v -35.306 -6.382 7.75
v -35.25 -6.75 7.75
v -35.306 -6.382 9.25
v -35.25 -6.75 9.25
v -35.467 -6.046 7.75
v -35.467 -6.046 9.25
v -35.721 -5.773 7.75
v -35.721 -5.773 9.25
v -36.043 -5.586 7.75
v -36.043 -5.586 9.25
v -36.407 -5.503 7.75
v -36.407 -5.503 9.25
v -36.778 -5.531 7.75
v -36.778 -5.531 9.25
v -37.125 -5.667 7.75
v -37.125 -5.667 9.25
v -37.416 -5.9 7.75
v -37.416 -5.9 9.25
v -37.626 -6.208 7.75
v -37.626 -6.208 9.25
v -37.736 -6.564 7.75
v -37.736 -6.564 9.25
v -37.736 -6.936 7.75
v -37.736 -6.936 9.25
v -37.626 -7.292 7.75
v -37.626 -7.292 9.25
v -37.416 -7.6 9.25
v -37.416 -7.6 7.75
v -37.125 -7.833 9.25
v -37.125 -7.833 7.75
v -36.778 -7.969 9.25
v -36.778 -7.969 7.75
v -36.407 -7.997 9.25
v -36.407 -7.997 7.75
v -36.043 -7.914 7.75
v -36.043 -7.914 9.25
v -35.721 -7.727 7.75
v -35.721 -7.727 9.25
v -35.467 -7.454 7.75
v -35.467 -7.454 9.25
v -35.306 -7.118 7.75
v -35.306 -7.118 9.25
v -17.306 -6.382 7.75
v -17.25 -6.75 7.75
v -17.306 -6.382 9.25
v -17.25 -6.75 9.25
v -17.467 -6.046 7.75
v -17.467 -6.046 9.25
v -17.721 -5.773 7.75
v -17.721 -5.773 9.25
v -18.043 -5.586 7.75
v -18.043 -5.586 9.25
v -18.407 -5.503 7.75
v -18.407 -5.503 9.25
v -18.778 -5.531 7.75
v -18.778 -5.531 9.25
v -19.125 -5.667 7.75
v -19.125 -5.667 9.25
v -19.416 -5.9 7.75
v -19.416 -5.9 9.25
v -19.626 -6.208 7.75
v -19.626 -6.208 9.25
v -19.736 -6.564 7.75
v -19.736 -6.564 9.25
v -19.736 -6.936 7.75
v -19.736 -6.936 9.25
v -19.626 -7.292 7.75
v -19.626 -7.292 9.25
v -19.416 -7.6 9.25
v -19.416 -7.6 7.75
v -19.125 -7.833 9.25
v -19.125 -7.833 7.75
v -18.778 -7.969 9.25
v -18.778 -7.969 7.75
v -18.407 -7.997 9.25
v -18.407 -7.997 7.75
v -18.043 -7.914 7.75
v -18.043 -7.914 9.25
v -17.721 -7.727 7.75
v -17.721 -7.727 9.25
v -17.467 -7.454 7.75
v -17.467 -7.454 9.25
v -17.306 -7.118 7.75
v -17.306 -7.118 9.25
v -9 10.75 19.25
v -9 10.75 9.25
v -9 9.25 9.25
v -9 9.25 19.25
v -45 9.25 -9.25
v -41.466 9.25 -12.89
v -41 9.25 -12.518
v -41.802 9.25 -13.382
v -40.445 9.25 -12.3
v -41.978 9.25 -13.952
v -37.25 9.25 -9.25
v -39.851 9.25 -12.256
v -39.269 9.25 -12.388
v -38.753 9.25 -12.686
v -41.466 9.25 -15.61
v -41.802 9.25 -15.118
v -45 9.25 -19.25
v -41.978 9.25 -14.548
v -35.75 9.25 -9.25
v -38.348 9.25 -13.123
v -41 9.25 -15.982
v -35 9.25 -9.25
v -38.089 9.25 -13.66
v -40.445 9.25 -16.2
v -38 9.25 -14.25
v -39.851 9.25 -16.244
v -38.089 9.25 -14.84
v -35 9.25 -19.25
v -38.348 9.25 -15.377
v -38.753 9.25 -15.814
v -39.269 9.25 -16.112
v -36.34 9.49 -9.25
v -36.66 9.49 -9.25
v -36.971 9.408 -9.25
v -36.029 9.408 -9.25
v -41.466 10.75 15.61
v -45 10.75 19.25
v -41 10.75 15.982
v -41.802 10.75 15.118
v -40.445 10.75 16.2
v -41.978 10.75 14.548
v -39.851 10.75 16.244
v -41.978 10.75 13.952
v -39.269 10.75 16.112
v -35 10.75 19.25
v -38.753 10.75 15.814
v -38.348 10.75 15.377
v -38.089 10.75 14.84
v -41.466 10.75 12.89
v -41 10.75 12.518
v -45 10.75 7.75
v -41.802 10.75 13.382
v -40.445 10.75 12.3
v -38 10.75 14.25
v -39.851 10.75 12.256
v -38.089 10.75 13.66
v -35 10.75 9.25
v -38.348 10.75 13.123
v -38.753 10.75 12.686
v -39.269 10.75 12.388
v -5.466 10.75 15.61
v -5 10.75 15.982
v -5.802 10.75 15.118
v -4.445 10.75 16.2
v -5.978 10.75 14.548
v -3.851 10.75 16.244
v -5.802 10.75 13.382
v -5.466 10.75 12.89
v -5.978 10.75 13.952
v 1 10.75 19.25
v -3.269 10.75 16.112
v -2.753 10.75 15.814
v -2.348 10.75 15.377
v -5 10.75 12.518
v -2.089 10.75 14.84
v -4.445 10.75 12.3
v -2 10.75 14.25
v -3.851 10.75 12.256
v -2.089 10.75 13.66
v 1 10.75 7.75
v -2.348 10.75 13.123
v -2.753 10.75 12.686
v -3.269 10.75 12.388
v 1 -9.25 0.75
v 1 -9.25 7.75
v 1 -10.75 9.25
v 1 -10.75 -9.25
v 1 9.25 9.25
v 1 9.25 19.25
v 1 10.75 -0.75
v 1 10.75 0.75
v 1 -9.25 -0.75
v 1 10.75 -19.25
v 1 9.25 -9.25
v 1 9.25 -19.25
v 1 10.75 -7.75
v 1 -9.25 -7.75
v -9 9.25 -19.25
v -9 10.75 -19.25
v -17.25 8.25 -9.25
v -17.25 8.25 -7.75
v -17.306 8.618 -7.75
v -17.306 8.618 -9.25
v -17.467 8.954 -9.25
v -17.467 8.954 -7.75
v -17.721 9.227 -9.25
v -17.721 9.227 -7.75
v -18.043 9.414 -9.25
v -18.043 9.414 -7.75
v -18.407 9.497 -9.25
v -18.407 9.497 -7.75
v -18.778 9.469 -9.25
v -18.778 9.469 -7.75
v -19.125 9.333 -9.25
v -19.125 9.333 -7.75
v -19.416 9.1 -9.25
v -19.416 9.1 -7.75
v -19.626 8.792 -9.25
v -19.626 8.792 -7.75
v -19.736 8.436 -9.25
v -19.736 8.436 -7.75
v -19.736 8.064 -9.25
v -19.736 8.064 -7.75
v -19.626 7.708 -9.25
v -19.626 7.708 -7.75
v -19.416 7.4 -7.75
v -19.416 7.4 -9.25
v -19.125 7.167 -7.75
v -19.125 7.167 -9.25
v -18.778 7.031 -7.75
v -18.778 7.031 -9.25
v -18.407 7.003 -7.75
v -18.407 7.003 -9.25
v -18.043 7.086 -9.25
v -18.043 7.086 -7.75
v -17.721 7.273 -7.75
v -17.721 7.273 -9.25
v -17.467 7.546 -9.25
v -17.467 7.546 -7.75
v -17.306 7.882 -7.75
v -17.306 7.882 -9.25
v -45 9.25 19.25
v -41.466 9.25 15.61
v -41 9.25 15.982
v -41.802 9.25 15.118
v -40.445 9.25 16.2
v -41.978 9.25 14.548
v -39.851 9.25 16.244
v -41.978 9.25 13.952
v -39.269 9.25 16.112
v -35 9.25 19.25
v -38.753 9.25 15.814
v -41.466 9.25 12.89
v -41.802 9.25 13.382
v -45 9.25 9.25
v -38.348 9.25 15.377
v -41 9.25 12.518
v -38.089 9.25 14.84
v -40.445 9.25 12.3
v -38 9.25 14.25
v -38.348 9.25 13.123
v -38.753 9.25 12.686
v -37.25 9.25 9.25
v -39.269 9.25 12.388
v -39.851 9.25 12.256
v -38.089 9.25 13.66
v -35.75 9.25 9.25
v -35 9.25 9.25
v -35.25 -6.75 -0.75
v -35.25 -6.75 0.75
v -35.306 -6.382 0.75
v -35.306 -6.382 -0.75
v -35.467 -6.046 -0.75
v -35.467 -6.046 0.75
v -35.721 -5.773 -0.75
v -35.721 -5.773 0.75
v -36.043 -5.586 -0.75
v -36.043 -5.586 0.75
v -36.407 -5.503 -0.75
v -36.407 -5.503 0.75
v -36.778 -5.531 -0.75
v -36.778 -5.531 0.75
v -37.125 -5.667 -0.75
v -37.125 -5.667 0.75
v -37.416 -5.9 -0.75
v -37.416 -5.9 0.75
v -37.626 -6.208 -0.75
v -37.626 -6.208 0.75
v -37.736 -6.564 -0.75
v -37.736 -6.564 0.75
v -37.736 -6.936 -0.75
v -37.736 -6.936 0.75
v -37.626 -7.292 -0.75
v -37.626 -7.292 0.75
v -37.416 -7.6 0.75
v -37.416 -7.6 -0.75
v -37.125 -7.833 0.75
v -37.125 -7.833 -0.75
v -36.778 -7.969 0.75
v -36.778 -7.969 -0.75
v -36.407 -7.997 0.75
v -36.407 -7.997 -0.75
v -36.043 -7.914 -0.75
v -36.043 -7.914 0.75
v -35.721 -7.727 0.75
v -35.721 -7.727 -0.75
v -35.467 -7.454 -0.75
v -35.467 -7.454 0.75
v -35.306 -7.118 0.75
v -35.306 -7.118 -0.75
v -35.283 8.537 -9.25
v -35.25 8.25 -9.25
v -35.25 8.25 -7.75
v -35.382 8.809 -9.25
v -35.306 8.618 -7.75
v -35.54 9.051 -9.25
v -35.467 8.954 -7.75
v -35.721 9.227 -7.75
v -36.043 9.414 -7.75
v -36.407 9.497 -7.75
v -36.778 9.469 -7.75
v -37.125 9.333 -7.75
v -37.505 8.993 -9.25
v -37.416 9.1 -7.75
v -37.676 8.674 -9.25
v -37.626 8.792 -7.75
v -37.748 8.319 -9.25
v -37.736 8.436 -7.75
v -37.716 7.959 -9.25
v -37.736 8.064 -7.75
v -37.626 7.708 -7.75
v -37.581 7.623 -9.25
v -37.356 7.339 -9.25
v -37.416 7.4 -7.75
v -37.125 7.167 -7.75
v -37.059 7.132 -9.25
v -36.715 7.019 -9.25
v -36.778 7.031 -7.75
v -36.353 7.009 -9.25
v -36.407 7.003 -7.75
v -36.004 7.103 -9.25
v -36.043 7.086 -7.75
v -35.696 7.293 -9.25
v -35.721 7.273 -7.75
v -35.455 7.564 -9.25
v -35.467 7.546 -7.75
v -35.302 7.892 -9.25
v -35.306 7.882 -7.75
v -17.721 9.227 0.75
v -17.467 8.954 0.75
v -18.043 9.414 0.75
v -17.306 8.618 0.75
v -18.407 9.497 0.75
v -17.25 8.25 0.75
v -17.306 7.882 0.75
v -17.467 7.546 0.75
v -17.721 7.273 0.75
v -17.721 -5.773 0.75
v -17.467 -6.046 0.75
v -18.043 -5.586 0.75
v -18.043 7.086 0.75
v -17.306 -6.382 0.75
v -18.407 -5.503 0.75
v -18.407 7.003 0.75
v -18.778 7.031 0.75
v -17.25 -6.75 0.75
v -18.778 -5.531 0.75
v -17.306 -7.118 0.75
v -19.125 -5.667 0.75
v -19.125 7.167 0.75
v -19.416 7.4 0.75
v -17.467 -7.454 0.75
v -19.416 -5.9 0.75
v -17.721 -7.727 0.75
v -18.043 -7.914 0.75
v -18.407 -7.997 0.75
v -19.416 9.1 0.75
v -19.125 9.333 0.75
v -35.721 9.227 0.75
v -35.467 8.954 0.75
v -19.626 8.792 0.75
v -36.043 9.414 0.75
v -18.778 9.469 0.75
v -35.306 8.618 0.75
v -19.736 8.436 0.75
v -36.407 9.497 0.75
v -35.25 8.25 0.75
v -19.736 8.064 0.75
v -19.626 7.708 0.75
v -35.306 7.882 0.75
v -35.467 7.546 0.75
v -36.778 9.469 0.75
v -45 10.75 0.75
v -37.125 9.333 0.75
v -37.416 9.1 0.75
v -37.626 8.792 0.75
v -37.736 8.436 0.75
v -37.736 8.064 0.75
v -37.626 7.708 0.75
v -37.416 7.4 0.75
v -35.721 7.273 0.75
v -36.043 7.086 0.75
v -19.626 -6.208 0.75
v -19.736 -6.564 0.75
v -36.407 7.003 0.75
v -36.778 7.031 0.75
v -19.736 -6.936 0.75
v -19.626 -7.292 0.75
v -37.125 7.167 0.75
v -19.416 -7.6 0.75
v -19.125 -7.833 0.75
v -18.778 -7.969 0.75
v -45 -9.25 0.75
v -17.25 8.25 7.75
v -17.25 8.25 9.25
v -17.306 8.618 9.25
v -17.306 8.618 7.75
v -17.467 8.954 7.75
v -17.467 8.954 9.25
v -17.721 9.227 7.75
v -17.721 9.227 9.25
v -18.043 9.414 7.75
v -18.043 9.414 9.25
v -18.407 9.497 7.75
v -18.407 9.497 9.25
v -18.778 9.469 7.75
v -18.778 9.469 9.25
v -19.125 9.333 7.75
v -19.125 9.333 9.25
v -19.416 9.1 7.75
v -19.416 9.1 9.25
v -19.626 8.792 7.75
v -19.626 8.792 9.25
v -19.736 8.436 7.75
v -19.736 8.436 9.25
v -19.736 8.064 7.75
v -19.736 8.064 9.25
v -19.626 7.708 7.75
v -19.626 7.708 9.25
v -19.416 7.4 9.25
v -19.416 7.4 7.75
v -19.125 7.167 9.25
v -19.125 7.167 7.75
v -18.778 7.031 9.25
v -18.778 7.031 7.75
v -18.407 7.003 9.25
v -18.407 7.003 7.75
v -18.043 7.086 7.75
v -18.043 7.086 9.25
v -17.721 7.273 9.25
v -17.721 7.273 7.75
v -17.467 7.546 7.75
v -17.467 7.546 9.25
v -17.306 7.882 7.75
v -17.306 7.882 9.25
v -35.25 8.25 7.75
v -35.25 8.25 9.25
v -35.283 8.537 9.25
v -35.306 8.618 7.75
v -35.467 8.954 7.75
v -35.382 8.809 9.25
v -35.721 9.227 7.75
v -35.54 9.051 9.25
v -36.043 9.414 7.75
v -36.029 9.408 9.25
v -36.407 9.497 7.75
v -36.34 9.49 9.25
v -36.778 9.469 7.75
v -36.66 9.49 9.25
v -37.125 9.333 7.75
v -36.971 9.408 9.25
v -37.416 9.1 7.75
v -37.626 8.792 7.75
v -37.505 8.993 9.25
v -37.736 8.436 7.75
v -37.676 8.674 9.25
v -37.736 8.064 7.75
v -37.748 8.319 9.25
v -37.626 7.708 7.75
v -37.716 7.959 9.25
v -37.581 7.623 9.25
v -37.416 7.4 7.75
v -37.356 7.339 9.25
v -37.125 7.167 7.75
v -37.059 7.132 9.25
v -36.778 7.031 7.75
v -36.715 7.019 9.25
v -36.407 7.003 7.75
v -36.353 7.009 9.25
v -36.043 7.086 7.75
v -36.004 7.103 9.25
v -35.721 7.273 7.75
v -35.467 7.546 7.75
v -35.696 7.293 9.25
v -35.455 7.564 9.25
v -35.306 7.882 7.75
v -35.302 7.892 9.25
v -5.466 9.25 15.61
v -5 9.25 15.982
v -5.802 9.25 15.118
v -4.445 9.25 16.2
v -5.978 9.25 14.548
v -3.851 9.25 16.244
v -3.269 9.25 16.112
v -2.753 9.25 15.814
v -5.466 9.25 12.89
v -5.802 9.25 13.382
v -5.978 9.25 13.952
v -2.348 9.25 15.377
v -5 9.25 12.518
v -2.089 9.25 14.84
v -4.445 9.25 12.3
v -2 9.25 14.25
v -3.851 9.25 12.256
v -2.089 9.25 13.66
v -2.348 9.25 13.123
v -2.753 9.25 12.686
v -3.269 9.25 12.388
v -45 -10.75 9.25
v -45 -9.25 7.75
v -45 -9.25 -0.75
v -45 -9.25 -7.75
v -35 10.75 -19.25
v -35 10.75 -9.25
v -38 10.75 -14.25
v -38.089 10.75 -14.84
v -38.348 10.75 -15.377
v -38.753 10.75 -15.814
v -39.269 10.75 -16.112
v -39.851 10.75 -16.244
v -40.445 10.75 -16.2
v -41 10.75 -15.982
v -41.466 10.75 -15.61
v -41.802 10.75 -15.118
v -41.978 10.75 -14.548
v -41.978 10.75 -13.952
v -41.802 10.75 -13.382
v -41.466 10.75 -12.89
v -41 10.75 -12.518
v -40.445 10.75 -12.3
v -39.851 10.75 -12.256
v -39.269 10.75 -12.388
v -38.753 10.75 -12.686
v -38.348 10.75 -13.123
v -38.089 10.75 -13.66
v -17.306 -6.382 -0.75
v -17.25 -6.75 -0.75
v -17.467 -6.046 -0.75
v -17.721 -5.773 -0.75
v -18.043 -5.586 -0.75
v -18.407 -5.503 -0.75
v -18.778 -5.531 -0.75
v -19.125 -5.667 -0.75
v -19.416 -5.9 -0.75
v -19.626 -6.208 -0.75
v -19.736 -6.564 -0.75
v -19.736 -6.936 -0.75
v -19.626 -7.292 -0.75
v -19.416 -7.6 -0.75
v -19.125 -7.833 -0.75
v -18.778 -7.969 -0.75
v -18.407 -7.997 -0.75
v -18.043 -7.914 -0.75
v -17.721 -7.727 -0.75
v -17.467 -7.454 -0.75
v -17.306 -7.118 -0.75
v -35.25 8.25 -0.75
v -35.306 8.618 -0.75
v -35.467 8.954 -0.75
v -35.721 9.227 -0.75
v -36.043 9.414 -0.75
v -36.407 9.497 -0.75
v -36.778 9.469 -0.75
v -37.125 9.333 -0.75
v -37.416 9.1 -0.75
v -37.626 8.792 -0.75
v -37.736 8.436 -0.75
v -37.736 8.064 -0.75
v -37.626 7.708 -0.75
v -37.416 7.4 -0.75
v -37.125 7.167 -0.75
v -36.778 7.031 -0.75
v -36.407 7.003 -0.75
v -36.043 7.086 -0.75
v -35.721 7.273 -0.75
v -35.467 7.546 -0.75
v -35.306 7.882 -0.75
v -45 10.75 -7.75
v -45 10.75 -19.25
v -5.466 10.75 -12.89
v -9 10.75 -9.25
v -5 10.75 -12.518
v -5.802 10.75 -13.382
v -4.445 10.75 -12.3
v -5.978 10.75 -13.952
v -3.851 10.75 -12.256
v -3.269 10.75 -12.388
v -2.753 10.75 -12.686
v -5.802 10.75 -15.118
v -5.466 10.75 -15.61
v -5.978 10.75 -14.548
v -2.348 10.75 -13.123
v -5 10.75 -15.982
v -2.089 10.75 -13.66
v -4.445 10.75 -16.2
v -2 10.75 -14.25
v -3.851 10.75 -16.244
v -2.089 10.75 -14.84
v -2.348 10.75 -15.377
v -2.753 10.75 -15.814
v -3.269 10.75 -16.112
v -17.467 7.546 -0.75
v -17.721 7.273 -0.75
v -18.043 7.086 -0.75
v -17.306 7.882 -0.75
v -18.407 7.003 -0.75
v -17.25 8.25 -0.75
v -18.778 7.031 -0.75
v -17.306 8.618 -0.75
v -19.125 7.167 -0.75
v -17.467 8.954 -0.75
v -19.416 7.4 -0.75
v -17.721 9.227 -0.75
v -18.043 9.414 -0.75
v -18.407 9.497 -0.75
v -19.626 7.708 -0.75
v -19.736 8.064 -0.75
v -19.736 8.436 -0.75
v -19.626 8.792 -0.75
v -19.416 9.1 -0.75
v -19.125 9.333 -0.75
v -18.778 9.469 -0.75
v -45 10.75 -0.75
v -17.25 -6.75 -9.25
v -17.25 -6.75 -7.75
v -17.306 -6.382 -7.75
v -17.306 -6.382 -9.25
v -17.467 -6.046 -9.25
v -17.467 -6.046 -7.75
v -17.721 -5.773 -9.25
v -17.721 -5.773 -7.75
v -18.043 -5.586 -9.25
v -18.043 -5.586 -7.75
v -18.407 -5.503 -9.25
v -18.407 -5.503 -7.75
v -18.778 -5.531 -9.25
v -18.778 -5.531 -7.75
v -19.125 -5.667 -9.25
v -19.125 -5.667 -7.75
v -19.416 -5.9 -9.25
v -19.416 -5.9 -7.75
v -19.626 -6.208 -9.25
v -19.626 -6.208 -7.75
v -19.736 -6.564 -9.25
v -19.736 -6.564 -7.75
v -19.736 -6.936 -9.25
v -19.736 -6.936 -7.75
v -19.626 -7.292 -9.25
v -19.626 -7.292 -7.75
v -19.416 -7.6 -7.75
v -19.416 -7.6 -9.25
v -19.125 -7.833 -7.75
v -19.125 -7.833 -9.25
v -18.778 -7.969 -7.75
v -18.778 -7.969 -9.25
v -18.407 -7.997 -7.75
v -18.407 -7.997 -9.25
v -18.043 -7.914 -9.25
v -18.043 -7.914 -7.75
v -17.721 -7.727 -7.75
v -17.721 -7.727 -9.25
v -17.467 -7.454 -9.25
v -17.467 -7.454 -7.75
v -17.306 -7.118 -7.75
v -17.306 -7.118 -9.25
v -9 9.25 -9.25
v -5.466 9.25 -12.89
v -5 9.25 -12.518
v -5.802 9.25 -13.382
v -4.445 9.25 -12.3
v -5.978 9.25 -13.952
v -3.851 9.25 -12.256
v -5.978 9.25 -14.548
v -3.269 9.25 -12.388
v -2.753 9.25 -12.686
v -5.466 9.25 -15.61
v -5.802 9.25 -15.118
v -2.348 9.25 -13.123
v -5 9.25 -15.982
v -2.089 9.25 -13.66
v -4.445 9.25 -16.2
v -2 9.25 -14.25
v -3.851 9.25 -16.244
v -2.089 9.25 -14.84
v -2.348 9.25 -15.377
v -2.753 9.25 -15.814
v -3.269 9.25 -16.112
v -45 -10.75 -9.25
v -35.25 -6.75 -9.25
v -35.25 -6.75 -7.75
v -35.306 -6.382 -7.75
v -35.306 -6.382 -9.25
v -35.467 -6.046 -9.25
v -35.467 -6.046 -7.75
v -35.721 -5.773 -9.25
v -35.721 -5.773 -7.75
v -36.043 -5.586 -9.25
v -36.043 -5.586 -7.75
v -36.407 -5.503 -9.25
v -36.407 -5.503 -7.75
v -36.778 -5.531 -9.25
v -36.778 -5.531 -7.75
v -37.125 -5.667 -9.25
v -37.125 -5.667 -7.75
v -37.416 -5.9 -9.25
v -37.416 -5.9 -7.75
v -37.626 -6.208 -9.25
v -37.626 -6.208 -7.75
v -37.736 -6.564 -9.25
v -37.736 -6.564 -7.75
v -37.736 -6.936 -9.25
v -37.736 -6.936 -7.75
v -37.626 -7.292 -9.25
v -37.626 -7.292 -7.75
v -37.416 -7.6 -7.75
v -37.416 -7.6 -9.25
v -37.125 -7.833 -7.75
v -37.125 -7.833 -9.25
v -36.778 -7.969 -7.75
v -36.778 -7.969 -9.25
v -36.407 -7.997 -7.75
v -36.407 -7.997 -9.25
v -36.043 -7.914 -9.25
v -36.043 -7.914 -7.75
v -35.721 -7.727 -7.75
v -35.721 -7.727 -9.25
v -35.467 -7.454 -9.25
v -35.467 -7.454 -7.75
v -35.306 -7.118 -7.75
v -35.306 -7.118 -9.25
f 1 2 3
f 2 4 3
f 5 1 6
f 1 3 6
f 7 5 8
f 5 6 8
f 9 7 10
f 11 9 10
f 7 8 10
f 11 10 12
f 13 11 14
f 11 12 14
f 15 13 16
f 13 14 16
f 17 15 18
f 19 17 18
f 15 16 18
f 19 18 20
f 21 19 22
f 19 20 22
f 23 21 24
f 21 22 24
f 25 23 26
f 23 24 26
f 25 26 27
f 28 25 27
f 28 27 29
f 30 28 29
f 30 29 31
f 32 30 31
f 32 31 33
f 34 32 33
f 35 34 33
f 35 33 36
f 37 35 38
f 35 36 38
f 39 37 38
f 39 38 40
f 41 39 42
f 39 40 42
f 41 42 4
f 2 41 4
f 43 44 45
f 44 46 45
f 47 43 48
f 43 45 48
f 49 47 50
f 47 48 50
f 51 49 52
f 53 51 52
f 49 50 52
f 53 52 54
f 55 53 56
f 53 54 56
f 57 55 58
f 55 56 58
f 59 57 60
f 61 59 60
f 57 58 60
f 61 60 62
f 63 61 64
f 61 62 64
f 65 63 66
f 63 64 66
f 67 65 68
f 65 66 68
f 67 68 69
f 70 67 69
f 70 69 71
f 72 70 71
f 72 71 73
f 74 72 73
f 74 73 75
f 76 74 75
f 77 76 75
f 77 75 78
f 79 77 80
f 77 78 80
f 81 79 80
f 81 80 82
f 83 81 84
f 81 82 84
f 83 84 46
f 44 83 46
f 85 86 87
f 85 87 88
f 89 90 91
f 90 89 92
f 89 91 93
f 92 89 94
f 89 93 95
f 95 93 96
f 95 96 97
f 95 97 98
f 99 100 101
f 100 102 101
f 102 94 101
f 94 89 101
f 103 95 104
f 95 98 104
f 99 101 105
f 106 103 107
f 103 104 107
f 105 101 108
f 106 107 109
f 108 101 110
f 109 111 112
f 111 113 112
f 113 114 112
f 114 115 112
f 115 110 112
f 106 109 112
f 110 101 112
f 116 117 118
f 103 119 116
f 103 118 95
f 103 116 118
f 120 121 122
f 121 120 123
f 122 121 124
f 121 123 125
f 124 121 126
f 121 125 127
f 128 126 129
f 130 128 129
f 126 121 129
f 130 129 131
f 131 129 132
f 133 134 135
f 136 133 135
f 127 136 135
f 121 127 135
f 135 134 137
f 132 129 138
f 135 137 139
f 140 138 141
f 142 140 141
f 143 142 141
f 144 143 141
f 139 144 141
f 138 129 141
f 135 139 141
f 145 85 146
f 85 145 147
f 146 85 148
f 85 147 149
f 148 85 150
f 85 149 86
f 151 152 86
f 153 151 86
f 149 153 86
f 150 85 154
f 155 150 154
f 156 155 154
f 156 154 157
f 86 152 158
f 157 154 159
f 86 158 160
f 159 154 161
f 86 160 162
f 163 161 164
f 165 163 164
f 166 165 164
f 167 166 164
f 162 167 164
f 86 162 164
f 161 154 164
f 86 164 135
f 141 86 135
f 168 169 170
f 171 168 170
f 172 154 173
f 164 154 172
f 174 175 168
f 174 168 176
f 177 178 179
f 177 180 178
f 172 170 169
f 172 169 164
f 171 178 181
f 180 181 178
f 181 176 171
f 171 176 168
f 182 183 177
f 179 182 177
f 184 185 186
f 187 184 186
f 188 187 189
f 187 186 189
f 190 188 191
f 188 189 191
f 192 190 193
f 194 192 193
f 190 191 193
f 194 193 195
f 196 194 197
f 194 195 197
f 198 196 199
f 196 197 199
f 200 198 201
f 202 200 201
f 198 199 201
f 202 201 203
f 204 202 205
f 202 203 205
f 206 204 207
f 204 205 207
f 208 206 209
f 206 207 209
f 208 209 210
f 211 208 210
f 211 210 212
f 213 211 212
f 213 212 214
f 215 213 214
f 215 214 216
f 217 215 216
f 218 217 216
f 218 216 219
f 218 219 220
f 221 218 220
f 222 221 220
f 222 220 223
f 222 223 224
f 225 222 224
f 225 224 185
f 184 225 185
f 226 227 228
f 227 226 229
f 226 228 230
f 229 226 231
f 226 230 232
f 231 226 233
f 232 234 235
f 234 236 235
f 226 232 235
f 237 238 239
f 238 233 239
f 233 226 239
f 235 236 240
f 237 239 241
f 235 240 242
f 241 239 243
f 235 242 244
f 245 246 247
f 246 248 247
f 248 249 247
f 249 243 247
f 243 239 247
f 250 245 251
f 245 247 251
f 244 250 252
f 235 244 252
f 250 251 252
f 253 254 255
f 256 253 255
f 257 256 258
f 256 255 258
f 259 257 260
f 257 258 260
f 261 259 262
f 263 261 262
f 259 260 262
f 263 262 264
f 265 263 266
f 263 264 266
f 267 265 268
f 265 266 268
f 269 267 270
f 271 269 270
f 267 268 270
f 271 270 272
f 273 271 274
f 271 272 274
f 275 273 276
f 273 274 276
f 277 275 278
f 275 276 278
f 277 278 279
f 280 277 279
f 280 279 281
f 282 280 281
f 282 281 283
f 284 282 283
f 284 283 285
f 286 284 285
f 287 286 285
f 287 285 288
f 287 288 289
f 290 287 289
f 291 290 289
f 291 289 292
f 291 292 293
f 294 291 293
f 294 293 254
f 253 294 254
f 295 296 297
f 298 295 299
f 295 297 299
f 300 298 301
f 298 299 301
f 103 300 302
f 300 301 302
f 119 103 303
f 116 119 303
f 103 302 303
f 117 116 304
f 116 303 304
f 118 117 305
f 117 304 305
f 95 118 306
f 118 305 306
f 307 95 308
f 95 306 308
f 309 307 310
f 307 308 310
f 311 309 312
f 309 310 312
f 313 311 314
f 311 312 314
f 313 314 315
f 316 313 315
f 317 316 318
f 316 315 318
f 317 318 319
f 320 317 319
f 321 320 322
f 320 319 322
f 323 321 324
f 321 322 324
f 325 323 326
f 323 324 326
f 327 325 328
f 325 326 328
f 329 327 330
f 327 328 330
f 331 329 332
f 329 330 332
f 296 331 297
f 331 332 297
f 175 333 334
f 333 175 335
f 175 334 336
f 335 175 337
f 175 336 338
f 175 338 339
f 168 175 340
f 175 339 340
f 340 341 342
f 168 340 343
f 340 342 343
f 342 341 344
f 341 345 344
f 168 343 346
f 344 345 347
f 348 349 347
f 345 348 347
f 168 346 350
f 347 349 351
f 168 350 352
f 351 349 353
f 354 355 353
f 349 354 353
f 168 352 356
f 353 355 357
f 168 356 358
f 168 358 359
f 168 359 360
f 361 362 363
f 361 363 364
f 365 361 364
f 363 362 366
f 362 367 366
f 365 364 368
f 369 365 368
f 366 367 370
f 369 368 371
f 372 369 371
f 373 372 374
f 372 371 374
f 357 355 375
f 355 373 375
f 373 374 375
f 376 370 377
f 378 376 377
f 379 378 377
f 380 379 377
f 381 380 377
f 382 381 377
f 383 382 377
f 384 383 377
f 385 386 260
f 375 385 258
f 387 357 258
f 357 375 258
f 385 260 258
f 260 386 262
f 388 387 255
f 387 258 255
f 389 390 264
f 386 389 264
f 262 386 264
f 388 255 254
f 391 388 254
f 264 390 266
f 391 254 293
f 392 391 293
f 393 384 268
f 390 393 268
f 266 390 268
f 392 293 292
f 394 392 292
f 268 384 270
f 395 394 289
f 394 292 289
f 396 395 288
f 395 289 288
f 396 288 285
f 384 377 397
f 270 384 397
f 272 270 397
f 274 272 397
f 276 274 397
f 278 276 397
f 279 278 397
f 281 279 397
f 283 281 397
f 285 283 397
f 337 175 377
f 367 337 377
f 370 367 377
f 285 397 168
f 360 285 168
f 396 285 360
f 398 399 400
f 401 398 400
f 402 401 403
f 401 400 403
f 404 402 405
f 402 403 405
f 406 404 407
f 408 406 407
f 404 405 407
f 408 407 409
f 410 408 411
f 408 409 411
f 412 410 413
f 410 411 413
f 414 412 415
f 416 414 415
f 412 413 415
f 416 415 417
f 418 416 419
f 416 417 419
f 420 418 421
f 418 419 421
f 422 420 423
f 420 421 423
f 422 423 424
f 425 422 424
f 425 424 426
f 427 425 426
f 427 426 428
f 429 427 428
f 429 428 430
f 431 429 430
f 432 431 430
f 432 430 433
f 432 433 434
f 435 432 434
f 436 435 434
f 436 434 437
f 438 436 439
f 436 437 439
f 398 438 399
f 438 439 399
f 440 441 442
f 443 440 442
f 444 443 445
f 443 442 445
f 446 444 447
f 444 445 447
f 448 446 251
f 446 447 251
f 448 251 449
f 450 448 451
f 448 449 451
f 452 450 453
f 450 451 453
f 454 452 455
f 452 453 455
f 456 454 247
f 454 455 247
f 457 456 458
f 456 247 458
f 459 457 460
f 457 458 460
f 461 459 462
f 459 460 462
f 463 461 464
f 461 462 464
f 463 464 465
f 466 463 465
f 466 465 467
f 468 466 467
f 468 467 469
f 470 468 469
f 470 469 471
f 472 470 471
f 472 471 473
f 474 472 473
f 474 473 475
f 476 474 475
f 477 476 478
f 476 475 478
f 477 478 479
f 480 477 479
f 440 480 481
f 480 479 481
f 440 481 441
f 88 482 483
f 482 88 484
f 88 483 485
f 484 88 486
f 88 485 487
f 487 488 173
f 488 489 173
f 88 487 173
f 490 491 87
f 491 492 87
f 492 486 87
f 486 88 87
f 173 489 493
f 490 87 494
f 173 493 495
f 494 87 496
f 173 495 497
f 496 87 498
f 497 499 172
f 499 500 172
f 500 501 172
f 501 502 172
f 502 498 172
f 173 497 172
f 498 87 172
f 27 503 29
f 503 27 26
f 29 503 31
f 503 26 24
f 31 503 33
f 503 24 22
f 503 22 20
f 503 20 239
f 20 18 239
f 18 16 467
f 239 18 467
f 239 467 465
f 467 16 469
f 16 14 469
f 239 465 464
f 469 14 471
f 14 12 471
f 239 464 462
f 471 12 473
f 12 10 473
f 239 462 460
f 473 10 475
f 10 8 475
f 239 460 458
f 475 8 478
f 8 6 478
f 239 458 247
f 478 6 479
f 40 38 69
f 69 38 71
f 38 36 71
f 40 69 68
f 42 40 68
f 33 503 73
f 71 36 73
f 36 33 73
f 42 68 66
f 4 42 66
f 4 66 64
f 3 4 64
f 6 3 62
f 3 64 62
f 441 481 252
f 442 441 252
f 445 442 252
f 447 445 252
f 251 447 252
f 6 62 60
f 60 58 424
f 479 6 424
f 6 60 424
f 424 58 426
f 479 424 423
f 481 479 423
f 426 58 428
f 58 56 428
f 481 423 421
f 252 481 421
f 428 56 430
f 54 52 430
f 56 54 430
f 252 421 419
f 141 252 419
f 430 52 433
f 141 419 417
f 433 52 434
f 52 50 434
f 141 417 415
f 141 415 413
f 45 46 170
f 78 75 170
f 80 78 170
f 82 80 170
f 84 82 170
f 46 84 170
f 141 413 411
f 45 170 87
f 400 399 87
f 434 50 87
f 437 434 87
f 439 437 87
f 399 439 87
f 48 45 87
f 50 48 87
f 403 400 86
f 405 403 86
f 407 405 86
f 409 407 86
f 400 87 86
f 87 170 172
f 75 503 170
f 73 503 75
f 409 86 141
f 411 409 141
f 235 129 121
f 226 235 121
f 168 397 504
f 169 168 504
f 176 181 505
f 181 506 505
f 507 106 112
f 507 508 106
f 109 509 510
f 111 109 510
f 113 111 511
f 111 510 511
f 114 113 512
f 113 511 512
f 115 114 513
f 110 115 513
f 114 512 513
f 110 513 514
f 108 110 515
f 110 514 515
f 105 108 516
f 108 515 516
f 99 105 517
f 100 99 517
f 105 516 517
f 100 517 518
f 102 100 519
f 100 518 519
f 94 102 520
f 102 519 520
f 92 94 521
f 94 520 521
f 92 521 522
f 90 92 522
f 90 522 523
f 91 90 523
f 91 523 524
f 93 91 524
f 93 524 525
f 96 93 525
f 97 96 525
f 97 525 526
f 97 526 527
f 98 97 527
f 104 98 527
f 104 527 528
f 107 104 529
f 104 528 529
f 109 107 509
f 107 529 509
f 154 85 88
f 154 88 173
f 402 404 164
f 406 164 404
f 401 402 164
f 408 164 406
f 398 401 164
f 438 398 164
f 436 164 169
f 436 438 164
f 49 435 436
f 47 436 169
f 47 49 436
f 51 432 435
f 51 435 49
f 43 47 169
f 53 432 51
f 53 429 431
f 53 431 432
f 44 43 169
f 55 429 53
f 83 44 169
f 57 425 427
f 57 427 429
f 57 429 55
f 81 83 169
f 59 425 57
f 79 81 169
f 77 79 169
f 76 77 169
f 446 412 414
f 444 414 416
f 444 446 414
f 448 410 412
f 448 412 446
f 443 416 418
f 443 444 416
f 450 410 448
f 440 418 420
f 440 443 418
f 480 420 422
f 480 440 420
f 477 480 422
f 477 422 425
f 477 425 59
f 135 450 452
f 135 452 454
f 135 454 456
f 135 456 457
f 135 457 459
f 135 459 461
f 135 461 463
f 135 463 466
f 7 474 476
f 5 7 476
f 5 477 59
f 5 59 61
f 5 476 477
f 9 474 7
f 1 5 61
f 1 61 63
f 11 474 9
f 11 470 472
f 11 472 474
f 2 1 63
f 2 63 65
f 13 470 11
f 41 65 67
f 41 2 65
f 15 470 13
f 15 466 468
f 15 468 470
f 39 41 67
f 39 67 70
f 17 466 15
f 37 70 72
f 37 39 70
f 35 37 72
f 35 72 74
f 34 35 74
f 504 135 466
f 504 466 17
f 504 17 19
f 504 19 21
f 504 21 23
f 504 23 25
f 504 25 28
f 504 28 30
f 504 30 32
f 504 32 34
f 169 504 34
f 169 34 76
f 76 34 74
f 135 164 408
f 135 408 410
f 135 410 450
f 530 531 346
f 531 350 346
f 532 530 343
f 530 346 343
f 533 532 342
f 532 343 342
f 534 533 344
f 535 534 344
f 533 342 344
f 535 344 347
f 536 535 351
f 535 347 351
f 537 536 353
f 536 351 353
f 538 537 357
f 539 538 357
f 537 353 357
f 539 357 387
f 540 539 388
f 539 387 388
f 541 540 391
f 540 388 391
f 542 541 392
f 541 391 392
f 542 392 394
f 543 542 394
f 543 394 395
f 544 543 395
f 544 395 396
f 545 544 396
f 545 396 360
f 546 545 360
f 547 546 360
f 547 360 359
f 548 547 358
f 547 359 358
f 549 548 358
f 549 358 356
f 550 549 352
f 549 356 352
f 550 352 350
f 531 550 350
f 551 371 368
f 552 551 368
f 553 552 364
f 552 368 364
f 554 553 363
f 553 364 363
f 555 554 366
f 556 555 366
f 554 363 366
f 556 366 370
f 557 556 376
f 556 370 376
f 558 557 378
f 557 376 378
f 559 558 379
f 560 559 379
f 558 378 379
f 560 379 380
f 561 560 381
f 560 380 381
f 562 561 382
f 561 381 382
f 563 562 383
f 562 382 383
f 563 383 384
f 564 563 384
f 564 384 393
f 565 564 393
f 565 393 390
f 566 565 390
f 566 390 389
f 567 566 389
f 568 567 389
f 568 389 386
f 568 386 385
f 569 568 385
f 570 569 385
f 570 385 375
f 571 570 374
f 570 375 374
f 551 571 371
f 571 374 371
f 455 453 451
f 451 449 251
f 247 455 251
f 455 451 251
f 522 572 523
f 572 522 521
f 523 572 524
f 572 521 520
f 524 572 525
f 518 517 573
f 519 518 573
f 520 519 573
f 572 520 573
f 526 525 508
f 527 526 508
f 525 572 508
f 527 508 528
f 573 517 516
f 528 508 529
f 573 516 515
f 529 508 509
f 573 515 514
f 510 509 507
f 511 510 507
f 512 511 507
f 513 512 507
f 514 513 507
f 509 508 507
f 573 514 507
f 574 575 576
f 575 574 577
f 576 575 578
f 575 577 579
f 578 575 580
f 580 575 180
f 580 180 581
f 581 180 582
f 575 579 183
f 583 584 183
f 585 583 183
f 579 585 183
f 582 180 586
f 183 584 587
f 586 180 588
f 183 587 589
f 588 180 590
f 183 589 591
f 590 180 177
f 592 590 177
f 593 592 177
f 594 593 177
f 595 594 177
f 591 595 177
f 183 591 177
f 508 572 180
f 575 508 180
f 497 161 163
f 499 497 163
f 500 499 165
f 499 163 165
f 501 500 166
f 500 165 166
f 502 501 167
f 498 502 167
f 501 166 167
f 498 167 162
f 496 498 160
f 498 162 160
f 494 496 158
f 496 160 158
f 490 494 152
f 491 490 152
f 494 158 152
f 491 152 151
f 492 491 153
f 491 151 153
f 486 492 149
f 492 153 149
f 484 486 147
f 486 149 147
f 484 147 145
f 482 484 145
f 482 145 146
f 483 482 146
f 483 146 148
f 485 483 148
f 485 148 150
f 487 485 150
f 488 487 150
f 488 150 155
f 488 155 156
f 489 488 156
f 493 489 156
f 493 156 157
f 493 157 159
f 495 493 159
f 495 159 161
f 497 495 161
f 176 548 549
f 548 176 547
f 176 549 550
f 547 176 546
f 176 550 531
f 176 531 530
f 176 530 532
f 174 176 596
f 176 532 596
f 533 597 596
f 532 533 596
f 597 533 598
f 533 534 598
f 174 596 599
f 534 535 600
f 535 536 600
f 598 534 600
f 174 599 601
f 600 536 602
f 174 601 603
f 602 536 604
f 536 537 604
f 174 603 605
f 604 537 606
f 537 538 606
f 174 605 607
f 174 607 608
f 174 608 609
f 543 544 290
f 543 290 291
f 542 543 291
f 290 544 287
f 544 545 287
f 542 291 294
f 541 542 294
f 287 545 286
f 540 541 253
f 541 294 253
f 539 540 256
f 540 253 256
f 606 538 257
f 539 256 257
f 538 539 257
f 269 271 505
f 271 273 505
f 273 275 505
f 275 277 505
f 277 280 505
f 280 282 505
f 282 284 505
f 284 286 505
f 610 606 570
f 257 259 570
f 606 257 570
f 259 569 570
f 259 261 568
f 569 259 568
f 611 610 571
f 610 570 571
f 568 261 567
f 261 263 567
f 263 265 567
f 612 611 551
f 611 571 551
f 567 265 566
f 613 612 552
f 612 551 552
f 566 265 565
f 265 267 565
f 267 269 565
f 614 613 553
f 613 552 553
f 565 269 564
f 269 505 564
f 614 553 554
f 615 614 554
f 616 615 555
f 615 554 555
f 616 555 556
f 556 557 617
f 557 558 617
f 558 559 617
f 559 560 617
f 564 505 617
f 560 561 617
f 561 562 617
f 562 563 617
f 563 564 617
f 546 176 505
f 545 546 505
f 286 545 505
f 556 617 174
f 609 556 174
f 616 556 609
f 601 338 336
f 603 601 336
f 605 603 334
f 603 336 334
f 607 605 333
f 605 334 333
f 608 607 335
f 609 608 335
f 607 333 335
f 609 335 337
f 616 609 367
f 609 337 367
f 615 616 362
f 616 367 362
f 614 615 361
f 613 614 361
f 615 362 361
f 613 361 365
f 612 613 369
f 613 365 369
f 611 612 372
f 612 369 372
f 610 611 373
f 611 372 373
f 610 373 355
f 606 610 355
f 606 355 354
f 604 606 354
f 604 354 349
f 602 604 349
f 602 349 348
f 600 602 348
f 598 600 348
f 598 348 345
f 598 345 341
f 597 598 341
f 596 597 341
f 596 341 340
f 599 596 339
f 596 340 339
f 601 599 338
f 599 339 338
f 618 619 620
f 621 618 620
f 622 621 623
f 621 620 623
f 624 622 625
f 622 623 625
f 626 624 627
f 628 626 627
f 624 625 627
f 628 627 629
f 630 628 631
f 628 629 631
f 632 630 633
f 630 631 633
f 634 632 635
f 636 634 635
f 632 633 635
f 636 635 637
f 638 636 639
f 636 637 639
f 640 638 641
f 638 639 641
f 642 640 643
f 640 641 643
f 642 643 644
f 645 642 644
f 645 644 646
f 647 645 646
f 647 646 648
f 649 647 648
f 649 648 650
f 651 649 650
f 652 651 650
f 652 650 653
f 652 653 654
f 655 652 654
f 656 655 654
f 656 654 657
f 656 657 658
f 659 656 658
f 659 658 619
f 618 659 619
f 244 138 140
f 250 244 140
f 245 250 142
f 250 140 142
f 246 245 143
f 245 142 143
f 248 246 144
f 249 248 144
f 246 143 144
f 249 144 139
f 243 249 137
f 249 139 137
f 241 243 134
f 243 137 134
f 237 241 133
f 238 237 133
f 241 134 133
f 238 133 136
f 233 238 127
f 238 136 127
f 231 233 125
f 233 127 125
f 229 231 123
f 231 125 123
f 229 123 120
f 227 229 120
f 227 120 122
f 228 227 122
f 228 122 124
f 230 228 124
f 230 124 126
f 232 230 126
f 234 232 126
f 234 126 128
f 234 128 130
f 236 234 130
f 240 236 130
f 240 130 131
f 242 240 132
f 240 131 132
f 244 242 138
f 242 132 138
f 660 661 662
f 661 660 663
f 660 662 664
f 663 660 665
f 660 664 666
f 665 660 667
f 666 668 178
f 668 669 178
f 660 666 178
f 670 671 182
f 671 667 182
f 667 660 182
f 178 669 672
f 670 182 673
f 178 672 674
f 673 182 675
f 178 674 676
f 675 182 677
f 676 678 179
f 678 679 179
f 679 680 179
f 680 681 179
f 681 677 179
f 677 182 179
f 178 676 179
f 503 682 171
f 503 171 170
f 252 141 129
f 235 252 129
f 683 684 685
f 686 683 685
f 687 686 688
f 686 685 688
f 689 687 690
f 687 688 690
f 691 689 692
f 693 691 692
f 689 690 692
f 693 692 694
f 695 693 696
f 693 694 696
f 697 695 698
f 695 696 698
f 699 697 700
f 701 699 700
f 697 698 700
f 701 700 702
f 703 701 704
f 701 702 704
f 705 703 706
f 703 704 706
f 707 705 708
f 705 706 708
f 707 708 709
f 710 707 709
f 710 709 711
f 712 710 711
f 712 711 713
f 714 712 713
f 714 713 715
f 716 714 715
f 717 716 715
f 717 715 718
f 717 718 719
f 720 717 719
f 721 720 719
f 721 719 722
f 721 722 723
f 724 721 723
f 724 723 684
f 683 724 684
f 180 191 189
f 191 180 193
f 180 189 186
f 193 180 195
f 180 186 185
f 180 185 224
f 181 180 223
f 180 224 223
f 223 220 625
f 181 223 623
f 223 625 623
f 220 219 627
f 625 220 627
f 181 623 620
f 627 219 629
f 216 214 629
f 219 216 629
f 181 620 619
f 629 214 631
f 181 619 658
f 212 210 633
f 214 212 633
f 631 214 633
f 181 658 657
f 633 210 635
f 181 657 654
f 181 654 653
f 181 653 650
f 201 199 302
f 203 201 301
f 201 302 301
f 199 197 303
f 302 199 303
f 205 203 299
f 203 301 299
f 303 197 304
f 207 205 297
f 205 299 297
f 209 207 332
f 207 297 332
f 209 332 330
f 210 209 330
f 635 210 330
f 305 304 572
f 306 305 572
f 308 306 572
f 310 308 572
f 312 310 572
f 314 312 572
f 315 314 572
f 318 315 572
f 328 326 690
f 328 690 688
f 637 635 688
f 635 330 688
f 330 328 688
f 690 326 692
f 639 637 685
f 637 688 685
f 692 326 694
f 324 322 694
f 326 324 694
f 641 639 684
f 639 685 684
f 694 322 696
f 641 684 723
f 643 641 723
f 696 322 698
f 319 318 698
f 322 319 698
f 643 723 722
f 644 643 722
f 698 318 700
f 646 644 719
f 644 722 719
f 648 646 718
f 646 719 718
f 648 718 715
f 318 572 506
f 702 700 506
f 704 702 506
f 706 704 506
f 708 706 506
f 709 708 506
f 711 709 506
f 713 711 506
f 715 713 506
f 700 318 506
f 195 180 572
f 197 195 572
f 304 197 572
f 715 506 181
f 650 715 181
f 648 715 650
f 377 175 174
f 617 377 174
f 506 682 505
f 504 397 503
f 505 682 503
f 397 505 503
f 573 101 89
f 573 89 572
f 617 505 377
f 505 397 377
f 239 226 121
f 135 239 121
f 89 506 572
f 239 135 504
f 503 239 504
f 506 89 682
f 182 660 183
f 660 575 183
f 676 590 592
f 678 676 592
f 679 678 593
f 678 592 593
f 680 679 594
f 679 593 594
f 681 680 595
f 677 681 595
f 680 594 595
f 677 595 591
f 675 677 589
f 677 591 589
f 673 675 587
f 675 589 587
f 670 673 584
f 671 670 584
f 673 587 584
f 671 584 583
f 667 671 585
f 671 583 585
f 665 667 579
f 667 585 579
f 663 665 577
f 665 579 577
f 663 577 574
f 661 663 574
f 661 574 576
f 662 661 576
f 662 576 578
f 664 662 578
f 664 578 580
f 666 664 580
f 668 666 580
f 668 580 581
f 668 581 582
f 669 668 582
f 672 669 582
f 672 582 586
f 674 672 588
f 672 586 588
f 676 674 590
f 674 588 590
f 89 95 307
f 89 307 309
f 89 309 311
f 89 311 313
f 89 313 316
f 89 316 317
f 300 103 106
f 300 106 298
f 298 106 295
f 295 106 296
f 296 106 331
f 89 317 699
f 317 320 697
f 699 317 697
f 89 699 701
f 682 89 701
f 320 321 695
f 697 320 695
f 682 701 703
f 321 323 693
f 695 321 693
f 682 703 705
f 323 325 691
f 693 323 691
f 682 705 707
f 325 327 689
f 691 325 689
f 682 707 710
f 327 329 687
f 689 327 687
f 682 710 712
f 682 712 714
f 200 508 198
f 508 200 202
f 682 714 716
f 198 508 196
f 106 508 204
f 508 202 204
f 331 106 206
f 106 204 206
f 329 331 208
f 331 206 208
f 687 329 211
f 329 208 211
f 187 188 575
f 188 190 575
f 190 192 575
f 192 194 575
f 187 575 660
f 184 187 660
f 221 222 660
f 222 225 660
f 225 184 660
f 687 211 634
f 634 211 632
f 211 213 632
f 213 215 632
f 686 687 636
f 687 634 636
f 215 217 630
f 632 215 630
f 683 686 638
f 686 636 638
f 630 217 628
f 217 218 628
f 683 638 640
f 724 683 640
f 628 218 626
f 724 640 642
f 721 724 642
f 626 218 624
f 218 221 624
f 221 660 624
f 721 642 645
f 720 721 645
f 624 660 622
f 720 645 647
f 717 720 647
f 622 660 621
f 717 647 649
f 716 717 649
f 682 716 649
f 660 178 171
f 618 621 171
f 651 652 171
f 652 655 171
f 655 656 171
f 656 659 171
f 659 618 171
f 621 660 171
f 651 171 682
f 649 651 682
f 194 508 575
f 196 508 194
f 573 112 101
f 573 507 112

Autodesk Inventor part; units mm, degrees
ref_plane "YZ Plane" through (0, 0, 0) normal (1, 0, 0) x (0, 1, 0)
ref_plane "XZ Plane" through (0, 0, 0) normal (0, 1, 0) x (-1, 0, 0)
ref_plane "XY Plane" through (0, 0, 0) normal (0, 0, 1) x (1, 0, 0)
sketch "스케치1" plane through (0, 0, 0) normal (1, 0, 0) x (0, 1, 0)
  line L0 (10.75, -9.25) -> (-10.75, -9.25)
  line L1 (-10.75, -9.25) -> (-10.75, 9.25)
  line L2 (-10.75, 9.25) -> (10.75, 9.25)
  line L3 (10.75, 9.25) -> (10.75, -9.25)
  line L4 (10.75, -9.25) -> (-10.75, 9.25) construction
  line L5 (-10.75, -9.25) -> (10.75, 9.25) construction
  line L6 (10.75, 7.75) -> (-9.25, 7.75)
  line L7 (-9.25, 7.75) -> (-9.25, 0.75)
  line L8 (-9.25, 0.75) -> (10.75, 0.75)
  line L9 (10.75, 0.75) -> (10.75, 7.75)
  line L10 (-9.25, -7.75) -> (10.75, -7.75)
  line L11 (-9.25, -0.75) -> (-9.25, -7.75)
  line L12 (10.75, -0.75) -> (-9.25, -0.75)
  line L13 (10.75, 9.25) -> (12.25, 9.25)
  line L14 (12.25, 9.25) -> (12.25, -9.25)
  line L15 (12.25, -9.25) -> (10.75, -9.25)
  line L16 (10.75, -9.25) -> (10.75, 9.25)
  point P0 (0, 0)
  point P1 (10.75, -7.75)
  point P2 (10.75, -0.75)
  point P3 (-10, 7.75)
  point P4 (-10, -7.75)
  point P5 (-10, 0.75)
  point P6 (-10, -0.75)
  point P7 (-10, -0.75)
  point P8 (-10, -7.75)
  dimension "d0" = 21.5
  dimension "d1" = 18.5
  dimension "d2" = 20
  dimension "d3" = 7
  dimension "d4" = 1.5
  dimension "d7" = 8.5
  dimension "d18" = 1.5
extrude "돌출1" add sketch "스케치1" against normal blind 45 contours L0 L1 L2 L3 L6 L7 L8 L12 L11 L10
sketch "스케치2" plane through (0, 0, 0) normal (1, 0, 0) x (0, 0, -1)
  line L0 (-9.25, -10.75) -> (9.25, -10.75) projected
  line L1 (-9.25, 10.75) -> (-9.25, -10.75) projected
  line L2 (-9.25, 10.75) -> (9.25, 10.75)
  line L3 (9.25, 10.75) -> (9.25, -10.75)
  line L4 (9.25, -10.75) -> (-9.25, -10.75)
  line L5 (-9.25, -10.75) -> (-9.25, 10.75)
  line L6 (9.25, 10.75) -> (-9.25, 10.75)
  line L7 (-9.25, 10.75) -> (-7.75, 10.75) projected
  point P0 (0, 0)
extrude "돌출2" add sketch "스케치2" along normal blind 1
sketch "스케치4" plane through (-45, -10.75, 9.25) normal (0, 0, 1) x (1, 0, 0)
  circle A0 centre (8.5, 19) radius 1.25 projected
  circle A1 centre (26.5, 19) radius 1.25 projected
  circle A2 centre (26.5, 4) radius 1.25 projected
  circle A3 centre (8.5, 4) radius 1.25 projected
  point P0 (45, 10.75)
extrude "돌출3" cut sketch "스케치4" against normal blind 45
sketch "스케치9" plane through (0, 10.75, 7.75) normal (0, 1, 0) x (1, 0, 0)
  line L0 (-45, 7) -> (-45, 8.5) projected
  line L1 (0, 7) -> (-45, 7) projected
  line L2 (-45, -1.5) -> (1, -1.5) projected
  line L3 (-45, 17) -> (1, 17) projected
  line L4 (-45, 17) -> (-35, 17)
  line L5 (-45, -1.5) -> (-35, -1.5)
  line L6 (-35, -1.5) -> (-35, -11.5)
  line L7 (-35, -11.5) -> (-45, -11.5)
  line L8 (-45, -11.5) -> (-45, -1.5)
  circle A0 centre (-40, -6.5) radius 2
  line L9 (-45, 7.75) -> (0, 7.75) construction
  line L10 (-22, -1.5) -> (-22, 17) construction
  line L11 (-35, 17) -> (-35, 27)
  line L12 (-35, 27) -> (-45, 27)
  line L13 (-45, 27) -> (-45, 17)
  circle A1 centre (-40, 22) radius 2
  line L14 (-45, 17) -> (-35, 17)
  line L15 (1, 17) -> (-9, 17)
  line L16 (1, -1.5) -> (-9, -1.5)
  line L17 (-9, -1.5) -> (-9, -11.5)
  line L18 (-9, -11.5) -> (1, -11.5)
  line L19 (1, -11.5) -> (1, -1.5)
  circle A2 centre (-4, -6.5) radius 2
  circle A3 centre (-4, 22) radius 2
  line L20 (-9, 17) -> (-9, 27)
  line L21 (-9, 27) -> (1, 27)
  line L22 (1, 27) -> (1, 17)
  line L23 (1, 17) -> (-9, 17)
  point P0 (-9, 17)
  dimension "d31" = 10
  dimension "d32" = 10
  dimension "d33" = 4
  dimension "d34" = 5
  dimension "d35" = 5
extrude "돌출6" add sketch "스케치9" against normal blind 1.5
sketch "스케치10" plane through (0, 0, 0) normal (-1, 0, 0) x (0, 0, 1)
  line L0 (-0.75, -9.25) -> (-0.75, 10.75) projected
  line L1 (-7.75, 10.75) -> (-0.75, 10.75) projected
  line L2 (-7.75, 10.75) -> (-7.75, -9.25) projected
  line L3 (-7.75, -9.25) -> (-0.75, -9.25) projected
  line L4 (1.75, 10.75) -> (1.75, -9.25) projected
  line L5 (1.75, -9.25) -> (7.75, -9.25) projected
  line L6 (7.75, 10.75) -> (7.75, -9.25) projected
  line L7 (1.75, 10.75) -> (7.75, 10.75) projected
  line L8 (0.75, 10.75) -> (0.75, -9.25) projected
  line L9 (0.75, -9.25) -> (7.75, -9.25) projected
  line L10 (7.75, -9.25) -> (7.75, 10.75) projected
  line L11 (0.75, 10.75) -> (7.75, 10.75) projected
  point P0 (0, 0)
extrude "돌출7" cut sketch "스케치10" against normal blind 10
properties part number "SAFRS-P-0031"
